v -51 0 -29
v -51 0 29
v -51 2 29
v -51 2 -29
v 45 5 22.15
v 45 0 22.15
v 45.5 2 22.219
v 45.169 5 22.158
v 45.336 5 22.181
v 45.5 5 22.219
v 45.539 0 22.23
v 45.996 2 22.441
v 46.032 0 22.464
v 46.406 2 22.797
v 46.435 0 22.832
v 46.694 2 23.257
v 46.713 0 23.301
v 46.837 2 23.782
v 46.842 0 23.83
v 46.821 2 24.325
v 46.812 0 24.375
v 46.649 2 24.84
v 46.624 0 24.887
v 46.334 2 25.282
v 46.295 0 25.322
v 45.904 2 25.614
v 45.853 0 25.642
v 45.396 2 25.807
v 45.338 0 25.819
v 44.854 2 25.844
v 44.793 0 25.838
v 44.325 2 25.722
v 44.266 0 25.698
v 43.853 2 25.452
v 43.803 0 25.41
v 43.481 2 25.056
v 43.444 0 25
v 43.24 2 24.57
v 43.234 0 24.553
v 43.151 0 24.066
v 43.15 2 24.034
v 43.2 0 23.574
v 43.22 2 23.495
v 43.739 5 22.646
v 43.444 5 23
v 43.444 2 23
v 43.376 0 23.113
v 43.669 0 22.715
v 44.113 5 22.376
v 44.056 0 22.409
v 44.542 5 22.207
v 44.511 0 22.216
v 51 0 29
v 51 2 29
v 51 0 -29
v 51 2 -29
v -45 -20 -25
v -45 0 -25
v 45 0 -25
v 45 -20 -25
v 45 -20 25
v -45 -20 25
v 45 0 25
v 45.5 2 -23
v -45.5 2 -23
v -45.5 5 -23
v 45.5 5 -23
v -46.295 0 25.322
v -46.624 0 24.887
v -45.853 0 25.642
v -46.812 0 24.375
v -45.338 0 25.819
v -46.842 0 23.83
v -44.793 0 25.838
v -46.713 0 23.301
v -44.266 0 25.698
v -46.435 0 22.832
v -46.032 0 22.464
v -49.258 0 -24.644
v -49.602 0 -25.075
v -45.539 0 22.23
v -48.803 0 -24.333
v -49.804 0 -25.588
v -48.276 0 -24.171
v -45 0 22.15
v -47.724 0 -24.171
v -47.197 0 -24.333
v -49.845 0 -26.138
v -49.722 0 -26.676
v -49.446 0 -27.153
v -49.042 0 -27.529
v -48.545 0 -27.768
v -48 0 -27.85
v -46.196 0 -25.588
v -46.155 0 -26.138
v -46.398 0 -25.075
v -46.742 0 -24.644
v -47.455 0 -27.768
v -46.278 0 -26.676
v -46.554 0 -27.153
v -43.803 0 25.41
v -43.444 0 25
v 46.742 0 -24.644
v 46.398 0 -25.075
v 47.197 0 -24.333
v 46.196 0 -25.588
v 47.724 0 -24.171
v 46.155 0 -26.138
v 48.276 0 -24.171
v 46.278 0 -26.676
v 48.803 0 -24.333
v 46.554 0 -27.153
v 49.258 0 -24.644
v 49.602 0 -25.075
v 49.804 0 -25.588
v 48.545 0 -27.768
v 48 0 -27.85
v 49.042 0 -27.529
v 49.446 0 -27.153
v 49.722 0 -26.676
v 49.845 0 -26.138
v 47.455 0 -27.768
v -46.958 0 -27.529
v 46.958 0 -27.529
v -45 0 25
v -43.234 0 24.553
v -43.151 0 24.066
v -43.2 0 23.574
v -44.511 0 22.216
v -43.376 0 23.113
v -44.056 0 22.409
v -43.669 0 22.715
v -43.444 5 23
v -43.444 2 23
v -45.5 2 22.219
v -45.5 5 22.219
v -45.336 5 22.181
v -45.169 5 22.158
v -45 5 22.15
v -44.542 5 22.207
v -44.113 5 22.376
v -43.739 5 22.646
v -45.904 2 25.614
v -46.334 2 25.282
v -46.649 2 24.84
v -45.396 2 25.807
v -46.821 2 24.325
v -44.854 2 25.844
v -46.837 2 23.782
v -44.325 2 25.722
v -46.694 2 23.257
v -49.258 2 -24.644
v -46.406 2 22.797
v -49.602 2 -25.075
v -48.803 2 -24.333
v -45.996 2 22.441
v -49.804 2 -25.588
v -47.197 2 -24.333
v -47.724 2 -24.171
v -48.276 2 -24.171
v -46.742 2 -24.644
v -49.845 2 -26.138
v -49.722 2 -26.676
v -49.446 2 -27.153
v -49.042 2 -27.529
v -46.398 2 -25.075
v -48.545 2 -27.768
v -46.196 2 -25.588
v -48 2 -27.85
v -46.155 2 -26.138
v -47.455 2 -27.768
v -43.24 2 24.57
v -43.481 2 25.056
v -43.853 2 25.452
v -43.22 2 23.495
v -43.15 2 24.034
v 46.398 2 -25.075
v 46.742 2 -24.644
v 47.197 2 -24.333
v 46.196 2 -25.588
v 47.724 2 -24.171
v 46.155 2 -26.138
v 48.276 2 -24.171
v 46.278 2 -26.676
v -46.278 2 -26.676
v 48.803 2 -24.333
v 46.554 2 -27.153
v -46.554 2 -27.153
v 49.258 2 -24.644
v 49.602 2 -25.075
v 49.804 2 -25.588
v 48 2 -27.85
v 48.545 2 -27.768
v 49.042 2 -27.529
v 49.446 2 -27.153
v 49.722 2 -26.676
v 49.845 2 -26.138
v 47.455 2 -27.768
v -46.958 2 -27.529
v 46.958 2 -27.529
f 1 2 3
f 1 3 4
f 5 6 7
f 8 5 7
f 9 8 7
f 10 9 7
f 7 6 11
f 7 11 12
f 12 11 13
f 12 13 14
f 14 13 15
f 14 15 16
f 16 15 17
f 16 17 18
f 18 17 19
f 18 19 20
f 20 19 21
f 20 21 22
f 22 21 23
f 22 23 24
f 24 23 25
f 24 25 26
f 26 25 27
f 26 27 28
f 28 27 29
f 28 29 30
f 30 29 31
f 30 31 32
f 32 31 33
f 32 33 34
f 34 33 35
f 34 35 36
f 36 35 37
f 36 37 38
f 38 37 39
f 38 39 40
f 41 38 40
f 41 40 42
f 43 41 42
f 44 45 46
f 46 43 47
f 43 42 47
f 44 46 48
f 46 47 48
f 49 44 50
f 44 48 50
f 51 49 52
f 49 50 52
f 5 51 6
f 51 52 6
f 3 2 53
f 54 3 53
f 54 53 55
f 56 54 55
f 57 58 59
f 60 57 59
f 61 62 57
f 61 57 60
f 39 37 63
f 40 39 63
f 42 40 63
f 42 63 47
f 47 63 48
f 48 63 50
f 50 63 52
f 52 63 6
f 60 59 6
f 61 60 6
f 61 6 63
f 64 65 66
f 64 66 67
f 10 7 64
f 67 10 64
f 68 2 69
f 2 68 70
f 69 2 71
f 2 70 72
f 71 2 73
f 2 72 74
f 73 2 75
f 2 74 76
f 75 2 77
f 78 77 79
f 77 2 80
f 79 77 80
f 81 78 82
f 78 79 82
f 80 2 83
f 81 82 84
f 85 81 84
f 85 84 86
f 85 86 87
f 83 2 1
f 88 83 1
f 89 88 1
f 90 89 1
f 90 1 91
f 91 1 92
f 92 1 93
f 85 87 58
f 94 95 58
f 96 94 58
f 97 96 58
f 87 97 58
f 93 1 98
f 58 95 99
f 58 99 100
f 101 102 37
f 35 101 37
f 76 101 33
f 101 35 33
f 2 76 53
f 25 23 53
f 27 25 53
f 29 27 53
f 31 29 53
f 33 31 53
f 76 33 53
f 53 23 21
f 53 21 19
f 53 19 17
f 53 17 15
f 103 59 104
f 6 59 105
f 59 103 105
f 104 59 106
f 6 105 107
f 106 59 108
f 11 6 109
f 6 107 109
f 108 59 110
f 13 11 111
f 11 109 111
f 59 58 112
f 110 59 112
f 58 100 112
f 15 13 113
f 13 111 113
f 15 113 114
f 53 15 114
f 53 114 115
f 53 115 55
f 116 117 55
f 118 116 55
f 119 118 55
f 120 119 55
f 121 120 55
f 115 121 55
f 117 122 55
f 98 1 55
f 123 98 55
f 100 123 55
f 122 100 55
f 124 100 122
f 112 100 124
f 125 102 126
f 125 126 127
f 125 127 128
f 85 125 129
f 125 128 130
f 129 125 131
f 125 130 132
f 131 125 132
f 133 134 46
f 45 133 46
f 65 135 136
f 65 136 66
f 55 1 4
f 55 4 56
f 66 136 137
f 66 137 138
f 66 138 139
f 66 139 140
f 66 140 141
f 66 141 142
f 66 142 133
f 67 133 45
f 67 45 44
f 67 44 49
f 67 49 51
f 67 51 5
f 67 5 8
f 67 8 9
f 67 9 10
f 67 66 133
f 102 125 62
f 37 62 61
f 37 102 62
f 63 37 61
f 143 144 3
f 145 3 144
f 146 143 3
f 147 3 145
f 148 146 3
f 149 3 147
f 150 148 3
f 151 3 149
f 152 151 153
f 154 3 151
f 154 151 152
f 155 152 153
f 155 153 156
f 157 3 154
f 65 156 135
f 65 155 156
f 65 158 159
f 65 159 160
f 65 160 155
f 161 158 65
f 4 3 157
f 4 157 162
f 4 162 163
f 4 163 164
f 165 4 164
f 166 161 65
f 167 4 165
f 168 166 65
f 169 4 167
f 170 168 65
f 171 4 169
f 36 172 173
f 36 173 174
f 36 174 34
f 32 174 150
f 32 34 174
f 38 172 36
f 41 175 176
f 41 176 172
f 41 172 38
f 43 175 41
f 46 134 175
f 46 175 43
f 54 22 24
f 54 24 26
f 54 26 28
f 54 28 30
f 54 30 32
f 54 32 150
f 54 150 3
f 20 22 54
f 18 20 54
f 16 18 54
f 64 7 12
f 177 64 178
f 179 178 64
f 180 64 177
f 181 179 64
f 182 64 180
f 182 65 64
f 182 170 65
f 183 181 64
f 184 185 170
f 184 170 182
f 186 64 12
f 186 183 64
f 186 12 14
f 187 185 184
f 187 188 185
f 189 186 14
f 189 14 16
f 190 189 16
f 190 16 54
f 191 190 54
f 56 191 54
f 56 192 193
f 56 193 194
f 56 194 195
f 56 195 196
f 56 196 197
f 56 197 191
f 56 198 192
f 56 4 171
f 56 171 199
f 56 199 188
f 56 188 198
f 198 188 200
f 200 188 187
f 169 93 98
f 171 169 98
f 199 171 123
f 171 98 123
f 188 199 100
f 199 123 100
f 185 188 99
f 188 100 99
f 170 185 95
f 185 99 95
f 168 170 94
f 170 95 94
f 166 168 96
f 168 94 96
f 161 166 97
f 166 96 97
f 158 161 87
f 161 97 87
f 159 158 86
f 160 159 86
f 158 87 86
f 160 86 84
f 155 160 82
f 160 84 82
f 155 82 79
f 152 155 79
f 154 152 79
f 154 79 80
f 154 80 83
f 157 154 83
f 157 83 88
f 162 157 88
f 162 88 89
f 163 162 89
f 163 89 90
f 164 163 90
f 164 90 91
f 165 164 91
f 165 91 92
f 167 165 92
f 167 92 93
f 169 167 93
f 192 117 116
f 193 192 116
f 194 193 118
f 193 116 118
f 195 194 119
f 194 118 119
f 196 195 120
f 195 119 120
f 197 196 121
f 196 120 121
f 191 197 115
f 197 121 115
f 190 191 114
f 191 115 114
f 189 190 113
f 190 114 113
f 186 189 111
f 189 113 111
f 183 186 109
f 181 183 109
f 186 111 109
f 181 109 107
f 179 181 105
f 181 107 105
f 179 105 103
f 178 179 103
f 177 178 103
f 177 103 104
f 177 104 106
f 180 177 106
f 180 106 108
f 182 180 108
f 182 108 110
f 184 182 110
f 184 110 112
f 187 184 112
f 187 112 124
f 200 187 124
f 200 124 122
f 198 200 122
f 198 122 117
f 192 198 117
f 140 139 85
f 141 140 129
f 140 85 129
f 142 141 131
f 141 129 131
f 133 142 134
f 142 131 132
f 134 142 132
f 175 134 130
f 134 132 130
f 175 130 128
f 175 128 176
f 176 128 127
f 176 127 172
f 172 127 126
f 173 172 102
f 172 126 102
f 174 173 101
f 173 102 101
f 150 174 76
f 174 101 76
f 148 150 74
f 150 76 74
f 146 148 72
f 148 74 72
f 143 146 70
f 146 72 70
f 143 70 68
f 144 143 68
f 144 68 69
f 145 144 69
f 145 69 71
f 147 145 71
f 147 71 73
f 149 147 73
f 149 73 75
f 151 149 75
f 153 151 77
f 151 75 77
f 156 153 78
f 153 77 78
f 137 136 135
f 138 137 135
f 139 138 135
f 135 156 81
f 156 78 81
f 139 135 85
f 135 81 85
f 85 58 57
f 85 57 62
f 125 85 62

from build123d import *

# Parameters (mm, degrees)
CROQUIS1_W              = 102
CROQUIS1_H              = 58
SALIENTE_EXTRUIR1_DEPTH = 2
CROQUIS2_W              = 91
CROQUIS2_H              = 46
SALIENTE_EXTRUIR2_DEPTH = 3
CROQUIS3_W              = 90
CROQUIS3_H              = 50
SALIENTE_EXTRUIR3_DEPTH = 20
CROQUIS4_R              = 1.85
CORTAR_EXTRUIR1_DEPTH   = 62.983868869


with BuildPart() as part:
    # Croquis1 → Saliente-Extruir1 (new body)
    with BuildSketch(Plane(origin=(0, 0, 0), x_dir=(1, 0, 0), z_dir=(0, 1, 0))):
        Rectangle(CROQUIS1_W, CROQUIS1_H)
    extrude(amount=SALIENTE_EXTRUIR1_DEPTH)

    # Croquis2 → Saliente-Extruir2 (add)
    with BuildSketch(Plane(origin=(0, 2, 0), x_dir=(1, 0, 0), z_dir=(0, 1, 0))):
        Rectangle(CROQUIS2_W, CROQUIS2_H)
    extrude(amount=SALIENTE_EXTRUIR2_DEPTH)

    # Croquis3 → Saliente-Extruir3 (add)
    with BuildSketch(Plane.XZ):
        Rectangle(CROQUIS3_W, CROQUIS3_H)
    extrude(amount=SALIENTE_EXTRUIR3_DEPTH)

    # Croquis4 → Cortar-Extruir1 (cut, through all)
    with BuildSketch(Plane.XZ):
        with Locations(Location((-45, 24, 0), (0, 0, 270))):
            Circle(CROQUIS4_R)
        with Locations(Location((45, 24, 0), (0, 0, 270))):
            Circle(CROQUIS4_R)
        with Locations(Location((-48, -26, 0), (0, 0, 270))):
            Circle(CROQUIS4_R)
        with Locations(Location((48, -26, 0), (0, 0, 270))):
            Circle(CROQUIS4_R)
    extrude(amount=-CORTAR_EXTRUIR1_DEPTH, mode=Mode.SUBTRACT)


solid = part.part
